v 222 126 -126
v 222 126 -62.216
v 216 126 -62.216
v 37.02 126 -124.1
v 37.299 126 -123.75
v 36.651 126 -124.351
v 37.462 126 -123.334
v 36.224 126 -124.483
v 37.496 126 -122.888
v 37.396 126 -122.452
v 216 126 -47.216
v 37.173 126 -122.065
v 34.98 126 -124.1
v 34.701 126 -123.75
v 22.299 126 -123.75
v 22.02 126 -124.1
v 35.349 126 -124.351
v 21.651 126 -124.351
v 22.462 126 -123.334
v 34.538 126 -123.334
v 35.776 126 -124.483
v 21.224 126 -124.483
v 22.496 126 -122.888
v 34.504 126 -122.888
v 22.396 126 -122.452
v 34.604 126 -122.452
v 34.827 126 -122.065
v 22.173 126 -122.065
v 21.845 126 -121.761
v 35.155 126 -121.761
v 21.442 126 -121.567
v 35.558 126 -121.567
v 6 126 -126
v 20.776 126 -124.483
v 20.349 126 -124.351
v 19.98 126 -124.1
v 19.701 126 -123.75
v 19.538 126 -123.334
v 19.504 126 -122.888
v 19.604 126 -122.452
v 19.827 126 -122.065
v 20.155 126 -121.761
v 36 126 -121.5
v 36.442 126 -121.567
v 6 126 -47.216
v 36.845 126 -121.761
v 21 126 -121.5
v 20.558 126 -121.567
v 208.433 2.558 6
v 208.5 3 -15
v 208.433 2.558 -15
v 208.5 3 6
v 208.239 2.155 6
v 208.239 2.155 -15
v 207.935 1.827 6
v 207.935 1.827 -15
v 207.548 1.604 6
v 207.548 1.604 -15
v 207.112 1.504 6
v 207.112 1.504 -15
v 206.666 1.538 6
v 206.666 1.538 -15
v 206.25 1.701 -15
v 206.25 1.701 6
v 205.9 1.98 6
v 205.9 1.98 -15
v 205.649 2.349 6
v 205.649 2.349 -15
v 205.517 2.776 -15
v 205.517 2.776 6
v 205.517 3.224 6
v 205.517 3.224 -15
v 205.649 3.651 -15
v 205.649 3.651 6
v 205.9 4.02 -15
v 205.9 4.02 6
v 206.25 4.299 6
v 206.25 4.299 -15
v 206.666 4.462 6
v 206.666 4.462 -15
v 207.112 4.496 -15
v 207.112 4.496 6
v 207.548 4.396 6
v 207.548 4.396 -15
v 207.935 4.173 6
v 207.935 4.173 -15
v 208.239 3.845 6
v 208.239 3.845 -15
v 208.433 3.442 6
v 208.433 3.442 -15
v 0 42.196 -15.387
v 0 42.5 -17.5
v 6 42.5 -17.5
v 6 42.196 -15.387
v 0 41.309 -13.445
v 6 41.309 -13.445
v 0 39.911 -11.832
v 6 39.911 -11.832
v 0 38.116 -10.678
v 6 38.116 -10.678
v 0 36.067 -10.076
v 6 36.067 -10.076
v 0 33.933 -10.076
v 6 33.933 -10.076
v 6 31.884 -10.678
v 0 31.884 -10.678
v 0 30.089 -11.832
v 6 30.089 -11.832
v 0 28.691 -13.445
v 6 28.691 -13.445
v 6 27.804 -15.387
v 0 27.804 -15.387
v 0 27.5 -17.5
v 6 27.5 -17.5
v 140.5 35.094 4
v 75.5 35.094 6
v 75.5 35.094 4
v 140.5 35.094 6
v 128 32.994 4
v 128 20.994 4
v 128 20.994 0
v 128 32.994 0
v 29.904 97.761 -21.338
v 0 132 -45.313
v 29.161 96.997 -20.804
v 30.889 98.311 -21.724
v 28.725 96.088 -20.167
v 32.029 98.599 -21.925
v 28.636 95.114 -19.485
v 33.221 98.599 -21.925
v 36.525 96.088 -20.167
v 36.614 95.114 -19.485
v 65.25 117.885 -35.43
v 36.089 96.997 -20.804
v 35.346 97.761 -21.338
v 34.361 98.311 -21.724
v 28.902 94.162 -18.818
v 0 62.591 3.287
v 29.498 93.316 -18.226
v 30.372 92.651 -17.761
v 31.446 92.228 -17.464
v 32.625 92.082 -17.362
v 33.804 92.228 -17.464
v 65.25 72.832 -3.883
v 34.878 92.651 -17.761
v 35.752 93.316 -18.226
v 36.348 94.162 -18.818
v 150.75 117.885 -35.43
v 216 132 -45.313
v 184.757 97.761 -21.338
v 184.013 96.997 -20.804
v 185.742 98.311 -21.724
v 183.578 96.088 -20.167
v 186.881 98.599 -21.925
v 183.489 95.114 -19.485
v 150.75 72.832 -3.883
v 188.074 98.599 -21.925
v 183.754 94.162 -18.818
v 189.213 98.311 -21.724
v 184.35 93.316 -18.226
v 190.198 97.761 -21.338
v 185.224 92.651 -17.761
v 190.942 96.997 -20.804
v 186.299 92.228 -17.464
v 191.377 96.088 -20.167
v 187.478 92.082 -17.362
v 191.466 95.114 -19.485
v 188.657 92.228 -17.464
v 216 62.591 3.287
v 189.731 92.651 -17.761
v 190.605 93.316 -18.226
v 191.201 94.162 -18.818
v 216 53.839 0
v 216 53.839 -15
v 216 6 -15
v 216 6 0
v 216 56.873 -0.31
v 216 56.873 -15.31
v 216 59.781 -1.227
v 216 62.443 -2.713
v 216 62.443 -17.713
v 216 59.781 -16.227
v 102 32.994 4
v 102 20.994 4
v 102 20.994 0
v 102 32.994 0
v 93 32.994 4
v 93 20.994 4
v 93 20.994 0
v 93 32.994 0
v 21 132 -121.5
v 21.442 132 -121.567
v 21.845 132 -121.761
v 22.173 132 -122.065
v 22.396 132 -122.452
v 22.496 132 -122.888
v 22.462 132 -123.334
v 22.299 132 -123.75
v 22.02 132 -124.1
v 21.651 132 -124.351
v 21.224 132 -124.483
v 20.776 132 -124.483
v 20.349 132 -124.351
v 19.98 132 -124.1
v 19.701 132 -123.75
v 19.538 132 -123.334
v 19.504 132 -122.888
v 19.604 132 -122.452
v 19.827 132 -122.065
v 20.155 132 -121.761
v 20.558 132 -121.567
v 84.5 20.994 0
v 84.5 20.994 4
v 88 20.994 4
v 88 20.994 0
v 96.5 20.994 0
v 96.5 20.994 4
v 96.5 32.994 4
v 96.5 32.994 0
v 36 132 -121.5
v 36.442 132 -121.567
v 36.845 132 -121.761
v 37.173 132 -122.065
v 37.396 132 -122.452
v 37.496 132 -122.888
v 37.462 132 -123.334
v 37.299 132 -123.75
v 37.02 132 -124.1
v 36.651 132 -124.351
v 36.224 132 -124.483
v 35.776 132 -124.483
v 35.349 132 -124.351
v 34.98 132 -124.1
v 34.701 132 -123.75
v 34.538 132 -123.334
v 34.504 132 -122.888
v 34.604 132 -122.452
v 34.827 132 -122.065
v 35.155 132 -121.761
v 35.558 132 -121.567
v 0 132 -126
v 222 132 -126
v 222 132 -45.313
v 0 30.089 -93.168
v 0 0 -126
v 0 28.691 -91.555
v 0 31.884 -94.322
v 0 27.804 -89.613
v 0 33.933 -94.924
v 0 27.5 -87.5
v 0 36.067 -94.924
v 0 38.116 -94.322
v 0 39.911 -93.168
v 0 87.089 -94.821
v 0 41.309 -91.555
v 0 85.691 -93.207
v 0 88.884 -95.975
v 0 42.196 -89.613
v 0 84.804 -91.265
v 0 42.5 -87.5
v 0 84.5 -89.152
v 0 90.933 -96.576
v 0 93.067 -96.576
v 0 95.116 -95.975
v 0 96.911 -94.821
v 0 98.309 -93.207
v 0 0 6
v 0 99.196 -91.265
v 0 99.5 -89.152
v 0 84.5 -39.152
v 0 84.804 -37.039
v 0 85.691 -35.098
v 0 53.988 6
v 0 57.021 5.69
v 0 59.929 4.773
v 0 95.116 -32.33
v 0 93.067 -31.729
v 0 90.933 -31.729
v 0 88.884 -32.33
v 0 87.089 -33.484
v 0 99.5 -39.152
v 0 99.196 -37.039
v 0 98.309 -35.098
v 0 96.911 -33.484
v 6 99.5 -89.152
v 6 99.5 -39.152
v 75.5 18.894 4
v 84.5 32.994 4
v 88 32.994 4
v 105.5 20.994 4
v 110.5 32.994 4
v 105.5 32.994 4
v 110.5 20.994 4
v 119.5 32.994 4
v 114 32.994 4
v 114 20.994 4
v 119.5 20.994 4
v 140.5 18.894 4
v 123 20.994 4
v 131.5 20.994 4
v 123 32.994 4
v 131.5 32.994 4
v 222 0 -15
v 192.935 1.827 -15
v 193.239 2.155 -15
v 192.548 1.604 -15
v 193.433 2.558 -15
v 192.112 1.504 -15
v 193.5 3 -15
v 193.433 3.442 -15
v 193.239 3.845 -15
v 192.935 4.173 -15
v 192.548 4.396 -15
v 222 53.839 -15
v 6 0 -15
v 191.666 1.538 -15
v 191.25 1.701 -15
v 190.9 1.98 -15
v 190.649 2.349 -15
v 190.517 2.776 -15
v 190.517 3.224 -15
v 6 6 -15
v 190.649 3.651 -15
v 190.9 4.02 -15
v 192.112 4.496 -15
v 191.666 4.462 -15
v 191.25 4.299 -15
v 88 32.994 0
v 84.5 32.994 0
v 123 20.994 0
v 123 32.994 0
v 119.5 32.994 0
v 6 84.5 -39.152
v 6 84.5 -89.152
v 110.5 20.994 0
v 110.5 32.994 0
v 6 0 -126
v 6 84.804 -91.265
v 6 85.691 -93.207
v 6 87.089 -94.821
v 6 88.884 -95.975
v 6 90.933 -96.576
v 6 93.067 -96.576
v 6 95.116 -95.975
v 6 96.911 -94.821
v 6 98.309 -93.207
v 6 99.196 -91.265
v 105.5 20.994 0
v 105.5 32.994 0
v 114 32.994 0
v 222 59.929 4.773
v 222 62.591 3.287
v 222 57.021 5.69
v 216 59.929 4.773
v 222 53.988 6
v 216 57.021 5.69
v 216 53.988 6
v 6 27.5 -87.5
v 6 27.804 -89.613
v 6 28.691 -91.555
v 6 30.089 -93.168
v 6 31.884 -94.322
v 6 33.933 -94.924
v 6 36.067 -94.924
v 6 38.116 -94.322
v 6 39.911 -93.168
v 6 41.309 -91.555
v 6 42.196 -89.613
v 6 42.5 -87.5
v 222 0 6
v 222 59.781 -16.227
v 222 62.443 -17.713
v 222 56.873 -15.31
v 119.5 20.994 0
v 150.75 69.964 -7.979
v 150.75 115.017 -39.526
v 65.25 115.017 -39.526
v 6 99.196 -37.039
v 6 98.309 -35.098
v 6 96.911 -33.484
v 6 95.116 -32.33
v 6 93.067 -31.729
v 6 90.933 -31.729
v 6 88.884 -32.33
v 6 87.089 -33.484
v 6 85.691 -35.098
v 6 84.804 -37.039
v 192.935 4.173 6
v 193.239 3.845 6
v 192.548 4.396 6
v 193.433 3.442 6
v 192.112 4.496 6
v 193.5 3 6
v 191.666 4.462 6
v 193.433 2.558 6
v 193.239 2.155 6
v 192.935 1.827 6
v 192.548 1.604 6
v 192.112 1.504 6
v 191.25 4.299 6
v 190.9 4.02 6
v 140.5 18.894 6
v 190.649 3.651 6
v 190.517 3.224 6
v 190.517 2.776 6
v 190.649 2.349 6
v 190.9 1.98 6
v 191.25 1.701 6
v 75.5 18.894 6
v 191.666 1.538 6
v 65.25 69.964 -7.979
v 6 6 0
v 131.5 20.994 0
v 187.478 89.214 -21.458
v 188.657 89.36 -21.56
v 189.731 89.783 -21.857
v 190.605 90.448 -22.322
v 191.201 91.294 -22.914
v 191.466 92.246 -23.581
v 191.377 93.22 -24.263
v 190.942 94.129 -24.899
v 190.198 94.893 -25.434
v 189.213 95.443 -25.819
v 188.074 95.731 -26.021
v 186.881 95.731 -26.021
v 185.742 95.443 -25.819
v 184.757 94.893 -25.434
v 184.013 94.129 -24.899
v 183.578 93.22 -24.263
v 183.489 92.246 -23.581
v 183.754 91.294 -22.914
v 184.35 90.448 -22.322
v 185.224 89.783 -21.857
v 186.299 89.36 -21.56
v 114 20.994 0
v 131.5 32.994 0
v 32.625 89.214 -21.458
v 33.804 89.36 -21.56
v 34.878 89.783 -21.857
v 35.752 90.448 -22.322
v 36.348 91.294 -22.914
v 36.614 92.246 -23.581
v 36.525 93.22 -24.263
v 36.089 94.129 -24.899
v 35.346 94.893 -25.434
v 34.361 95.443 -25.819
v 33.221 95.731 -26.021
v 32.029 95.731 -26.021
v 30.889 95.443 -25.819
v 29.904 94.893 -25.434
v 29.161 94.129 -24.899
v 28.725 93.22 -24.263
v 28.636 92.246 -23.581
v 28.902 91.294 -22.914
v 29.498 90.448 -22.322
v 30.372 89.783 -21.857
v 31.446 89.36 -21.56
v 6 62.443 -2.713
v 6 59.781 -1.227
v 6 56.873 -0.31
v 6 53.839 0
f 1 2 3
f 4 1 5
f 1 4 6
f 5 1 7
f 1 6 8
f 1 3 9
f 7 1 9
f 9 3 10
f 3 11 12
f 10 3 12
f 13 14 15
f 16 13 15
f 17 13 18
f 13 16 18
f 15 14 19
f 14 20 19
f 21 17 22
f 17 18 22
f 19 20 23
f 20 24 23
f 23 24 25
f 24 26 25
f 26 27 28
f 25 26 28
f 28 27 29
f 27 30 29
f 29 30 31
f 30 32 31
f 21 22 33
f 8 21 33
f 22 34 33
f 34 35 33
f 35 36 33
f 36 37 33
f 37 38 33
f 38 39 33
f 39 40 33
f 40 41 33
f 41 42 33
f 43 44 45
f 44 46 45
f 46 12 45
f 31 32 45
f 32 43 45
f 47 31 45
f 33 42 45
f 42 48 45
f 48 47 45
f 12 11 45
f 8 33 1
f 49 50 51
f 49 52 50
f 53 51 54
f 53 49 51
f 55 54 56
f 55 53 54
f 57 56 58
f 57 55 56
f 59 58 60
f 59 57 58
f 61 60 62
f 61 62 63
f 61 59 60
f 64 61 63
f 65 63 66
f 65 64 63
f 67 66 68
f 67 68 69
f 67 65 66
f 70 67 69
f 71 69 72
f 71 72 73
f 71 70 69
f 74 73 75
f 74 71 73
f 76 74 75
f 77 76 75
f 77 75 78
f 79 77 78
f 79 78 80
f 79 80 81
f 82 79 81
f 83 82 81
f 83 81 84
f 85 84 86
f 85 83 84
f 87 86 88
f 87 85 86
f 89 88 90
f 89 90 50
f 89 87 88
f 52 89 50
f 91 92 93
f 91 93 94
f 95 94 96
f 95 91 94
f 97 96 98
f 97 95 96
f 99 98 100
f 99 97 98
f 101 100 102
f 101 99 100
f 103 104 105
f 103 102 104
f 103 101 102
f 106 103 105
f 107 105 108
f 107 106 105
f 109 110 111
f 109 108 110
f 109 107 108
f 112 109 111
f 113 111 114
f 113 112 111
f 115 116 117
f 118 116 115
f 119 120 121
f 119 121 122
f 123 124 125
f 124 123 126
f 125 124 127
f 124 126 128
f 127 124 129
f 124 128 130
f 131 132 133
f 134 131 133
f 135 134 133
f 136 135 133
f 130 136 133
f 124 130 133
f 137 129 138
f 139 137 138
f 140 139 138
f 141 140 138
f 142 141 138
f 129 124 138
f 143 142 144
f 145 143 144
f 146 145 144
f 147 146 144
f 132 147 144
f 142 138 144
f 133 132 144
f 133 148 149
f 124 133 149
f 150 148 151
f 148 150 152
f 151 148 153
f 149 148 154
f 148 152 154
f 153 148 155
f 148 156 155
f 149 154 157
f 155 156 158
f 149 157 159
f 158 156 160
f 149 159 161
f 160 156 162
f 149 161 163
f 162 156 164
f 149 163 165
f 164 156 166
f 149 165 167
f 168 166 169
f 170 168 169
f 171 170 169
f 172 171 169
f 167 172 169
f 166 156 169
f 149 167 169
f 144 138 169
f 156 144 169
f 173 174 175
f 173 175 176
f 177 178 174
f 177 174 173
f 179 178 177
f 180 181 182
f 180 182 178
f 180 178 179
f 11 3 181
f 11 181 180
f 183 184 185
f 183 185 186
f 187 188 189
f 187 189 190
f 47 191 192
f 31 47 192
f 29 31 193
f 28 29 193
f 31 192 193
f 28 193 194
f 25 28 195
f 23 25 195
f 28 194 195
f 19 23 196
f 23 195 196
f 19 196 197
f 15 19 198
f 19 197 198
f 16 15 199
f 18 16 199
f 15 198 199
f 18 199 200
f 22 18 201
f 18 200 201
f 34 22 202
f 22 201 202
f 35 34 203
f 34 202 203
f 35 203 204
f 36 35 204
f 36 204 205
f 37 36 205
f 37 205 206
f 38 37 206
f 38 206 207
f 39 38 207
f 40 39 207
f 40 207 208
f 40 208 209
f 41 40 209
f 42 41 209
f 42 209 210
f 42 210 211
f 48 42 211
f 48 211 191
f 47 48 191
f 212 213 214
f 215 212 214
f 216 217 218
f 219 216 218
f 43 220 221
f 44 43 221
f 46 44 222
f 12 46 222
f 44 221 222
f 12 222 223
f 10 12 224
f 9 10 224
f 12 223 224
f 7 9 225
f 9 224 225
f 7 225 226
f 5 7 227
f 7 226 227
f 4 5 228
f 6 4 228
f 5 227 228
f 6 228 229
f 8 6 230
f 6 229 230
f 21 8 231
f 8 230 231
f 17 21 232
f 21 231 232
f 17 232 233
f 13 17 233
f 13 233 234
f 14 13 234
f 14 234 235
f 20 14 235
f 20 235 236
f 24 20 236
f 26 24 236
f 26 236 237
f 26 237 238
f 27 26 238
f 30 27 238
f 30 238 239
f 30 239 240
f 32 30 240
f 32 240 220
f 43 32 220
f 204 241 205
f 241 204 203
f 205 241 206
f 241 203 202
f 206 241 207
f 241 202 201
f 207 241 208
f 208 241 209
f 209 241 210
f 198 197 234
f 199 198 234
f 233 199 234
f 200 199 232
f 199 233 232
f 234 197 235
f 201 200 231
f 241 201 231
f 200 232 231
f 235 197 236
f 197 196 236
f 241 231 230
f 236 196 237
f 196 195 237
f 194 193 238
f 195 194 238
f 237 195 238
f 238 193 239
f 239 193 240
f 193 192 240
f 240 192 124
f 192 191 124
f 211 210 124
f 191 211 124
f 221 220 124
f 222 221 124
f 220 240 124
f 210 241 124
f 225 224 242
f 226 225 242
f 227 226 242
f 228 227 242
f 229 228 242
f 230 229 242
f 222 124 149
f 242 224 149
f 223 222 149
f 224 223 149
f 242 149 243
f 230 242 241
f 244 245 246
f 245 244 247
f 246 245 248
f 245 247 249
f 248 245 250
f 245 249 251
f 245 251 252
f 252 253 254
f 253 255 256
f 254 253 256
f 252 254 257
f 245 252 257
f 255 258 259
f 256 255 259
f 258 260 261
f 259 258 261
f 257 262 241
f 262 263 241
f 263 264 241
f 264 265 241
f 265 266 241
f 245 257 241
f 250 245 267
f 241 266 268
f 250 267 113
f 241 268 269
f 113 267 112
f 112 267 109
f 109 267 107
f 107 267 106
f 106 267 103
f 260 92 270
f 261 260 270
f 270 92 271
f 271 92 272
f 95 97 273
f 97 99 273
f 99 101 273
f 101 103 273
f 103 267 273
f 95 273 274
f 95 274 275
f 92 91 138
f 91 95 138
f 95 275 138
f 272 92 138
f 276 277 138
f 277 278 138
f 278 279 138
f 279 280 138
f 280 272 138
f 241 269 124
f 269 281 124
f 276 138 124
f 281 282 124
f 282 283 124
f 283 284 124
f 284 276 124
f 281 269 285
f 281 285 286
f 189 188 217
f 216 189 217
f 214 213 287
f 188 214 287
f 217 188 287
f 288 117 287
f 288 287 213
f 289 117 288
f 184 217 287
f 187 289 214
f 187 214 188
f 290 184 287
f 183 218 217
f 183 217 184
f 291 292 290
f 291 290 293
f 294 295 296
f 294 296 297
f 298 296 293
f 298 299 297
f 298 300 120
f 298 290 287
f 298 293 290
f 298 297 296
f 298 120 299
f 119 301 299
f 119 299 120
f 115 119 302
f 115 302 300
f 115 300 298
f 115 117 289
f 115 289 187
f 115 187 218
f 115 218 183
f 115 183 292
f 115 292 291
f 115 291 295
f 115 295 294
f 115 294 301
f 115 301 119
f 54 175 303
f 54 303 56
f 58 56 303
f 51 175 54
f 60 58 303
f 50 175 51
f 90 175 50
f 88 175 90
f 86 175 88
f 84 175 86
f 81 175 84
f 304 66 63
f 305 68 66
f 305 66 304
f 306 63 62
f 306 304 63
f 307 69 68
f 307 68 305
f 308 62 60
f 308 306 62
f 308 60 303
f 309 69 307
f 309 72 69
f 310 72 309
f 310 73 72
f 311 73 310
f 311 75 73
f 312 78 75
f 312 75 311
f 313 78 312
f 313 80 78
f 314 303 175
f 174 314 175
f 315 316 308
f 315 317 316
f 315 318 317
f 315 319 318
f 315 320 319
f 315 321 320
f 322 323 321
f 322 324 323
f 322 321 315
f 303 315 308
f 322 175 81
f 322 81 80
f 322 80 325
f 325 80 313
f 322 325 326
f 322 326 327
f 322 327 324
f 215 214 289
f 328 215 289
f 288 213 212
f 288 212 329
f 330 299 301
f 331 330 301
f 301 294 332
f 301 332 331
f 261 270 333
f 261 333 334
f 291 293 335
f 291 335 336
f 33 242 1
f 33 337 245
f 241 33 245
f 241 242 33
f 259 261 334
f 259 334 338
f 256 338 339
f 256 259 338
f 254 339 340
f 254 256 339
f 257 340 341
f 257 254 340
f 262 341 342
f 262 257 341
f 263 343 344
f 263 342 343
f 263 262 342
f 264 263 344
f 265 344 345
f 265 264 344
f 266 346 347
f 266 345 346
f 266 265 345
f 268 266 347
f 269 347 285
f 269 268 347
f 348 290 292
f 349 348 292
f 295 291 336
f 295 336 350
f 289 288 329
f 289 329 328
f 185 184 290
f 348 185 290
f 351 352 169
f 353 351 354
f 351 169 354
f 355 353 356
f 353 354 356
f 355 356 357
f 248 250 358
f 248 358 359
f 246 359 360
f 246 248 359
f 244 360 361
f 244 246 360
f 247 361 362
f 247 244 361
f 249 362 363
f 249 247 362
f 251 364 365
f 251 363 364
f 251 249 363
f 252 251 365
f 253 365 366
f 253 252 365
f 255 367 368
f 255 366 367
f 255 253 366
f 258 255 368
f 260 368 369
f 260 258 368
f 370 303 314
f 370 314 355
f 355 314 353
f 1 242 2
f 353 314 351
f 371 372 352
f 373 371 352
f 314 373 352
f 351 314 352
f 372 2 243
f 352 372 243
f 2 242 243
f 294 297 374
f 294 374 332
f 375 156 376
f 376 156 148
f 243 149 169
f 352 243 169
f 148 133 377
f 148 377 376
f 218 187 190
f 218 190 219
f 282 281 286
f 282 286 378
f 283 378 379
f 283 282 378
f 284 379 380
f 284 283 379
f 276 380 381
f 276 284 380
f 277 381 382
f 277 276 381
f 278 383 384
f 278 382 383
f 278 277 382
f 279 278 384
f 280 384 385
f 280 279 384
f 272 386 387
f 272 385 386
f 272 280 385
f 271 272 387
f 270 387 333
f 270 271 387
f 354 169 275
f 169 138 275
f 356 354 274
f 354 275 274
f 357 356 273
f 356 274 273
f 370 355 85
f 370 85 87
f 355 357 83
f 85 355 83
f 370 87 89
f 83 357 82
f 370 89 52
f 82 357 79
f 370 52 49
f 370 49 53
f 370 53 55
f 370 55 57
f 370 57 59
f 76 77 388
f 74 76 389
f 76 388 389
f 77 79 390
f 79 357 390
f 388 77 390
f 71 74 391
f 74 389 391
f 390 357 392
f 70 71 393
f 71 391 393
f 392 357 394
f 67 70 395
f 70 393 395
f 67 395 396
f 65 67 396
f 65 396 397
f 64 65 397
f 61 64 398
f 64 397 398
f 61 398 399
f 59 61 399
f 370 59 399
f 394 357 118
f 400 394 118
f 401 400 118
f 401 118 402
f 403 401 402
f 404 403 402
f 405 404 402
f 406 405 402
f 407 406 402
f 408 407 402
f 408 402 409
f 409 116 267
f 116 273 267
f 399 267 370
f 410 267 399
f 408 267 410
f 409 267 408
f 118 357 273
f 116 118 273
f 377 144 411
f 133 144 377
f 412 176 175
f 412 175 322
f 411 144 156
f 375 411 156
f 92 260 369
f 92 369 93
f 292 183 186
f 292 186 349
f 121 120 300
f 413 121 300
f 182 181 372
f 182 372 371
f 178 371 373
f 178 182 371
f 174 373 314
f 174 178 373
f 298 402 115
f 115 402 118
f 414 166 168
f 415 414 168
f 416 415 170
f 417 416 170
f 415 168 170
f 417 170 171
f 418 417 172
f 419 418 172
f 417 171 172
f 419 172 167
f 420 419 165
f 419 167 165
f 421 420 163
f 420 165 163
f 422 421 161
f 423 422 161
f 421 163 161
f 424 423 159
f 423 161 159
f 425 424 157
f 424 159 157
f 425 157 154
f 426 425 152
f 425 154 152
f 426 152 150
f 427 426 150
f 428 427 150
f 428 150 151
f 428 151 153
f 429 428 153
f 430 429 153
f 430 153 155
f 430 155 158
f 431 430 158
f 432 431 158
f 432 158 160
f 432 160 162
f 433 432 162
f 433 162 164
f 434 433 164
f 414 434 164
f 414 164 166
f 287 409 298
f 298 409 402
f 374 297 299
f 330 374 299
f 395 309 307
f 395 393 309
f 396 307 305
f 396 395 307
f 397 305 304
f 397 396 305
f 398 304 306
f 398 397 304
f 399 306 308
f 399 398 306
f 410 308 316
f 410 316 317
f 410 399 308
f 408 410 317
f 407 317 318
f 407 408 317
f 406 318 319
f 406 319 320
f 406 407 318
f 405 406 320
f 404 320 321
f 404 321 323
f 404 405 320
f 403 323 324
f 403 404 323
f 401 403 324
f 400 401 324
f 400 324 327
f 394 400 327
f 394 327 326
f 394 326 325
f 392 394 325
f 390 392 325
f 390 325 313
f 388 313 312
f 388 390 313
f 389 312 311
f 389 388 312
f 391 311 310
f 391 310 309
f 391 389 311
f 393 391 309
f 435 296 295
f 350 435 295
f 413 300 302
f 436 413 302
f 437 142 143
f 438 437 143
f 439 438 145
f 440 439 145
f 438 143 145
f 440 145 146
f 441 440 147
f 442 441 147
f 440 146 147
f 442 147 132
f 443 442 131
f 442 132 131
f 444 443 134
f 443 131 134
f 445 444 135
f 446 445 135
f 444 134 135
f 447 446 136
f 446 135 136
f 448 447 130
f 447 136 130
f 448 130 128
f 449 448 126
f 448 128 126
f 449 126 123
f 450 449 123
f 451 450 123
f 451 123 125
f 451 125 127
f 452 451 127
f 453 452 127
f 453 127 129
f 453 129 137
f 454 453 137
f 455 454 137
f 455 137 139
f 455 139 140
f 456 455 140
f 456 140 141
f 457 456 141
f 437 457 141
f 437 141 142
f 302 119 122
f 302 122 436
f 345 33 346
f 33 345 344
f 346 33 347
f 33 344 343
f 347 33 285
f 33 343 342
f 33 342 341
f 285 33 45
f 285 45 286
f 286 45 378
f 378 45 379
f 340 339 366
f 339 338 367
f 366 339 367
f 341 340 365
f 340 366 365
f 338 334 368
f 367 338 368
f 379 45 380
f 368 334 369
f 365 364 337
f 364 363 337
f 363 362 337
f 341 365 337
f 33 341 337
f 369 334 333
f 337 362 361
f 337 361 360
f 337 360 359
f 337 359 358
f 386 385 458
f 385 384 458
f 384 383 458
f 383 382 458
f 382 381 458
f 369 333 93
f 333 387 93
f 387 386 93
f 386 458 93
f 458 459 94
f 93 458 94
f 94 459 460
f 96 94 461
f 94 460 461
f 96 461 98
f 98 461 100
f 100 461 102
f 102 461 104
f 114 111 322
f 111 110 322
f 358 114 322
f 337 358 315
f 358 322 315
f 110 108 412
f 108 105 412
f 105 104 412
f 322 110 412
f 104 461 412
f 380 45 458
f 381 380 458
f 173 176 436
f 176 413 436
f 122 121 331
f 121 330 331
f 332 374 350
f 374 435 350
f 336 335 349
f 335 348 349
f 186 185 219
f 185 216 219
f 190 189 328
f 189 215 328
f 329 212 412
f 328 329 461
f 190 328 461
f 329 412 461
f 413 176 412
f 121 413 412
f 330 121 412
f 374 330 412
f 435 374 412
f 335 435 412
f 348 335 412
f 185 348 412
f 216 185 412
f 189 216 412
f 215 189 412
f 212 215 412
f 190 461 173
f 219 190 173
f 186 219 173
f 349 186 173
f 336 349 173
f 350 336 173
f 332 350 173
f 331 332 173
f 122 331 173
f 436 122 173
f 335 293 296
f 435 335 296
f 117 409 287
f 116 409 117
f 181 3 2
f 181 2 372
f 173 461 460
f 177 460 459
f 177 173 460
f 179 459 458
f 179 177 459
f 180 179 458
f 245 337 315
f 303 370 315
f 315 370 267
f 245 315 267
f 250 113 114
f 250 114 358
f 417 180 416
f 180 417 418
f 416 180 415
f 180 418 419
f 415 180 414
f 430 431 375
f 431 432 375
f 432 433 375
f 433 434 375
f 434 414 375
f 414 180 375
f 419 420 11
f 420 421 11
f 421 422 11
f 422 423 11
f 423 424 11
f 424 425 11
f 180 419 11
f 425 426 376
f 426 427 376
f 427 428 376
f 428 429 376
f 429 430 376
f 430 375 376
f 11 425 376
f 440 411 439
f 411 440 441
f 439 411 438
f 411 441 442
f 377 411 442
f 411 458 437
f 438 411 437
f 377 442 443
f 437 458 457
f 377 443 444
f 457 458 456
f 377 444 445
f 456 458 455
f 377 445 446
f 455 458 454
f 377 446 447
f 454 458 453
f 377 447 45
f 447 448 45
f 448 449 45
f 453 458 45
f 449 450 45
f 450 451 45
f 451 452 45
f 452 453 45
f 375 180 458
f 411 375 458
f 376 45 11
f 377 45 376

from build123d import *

# Parameters (mm, degrees)
SKETCH1_W            = 111
SKETCH1_H            = 126
BOSS_EXTRUDE1_DEPTH  = 6
SKETCH2_W            = 216
SKETCH2_H            = 111
BOSS_EXTRUDE2_DEPTH  = 6
SKETCH3_W            = 216
SKETCH3_H            = 132
BOSS_EXTRUDE3_DEPTH  = 6
SKETCH5_W            = 216
SKETCH5_H            = 99.986345045
CUT_EXTRUDE1_DEPTH   = 75
SKETCH7_W            = 216
SKETCH7_H            = 99.986345045
BOSS_EXTRUDE4_DEPTH  = 5
CUT_EXTRUDE2_DEPTH   = 314
SKETCH9_W            = 85.5
SKETCH9_H            = 55
CUT_EXTRUDE3_DEPTH   = 14
FILLET1_R            = 15
CUT_EXTRUDE4_DEPTH   = 27
SKETCH11_W           = 65
SKETCH11_H           = 16.2
CUT_EXTRUDE5_DEPTH   = 2
SKETCH12_W           = 3.5
SKETCH12_H           = 12
CUT_EXTRUDE6_DEPTH   = 11
BOSS_EXTRUDE5_DEPTH  = 6
SKETCH22_R           = 1.5
CUT_EXTRUDE13_DEPTH  = 20
BOSS_EXTRUDE6_DEPTH  = 15
SKETCH25_R           = 1.5
CUT_EXTRUDE14_DEPTH  = 15
BOSS_EXTRUDE9_START  = -6
BOSS_EXTRUDE9_DEPTH  = 6
SKETCH35_W           = 210
SKETCH35_H           = 6
SKETCH35_R           = 1.5
BOSS_EXTRUDE10_DEPTH = 15
SKETCH36_R           = 4
CUT_EXTRUDE16_DEPTH  = 15
SKETCH37_R           = 4
CUT_EXTRUDE17_DEPTH  = 15


with BuildPart() as part:
    # Sketch1 → Boss-Extrude1 (new body)
    with BuildSketch(Plane(origin=(0, 0, 0), x_dir=(0, 0, -1), z_dir=(1, 0, 0))):
        with Locations((55.5, 63)):
            Rectangle(SKETCH1_W, SKETCH1_H)
    extrude(amount=BOSS_EXTRUDE1_DEPTH)

    # Sketch2 → Boss-Extrude2 (add)
    with BuildSketch(Plane(origin=(0, 126, 0), x_dir=(1, 0, 0), z_dir=(0, 1, 0))):
        with Locations((108, 55.5)):
            Rectangle(SKETCH2_W, SKETCH2_H)
    extrude(amount=BOSS_EXTRUDE2_DEPTH)

    # Sketch3 → Boss-Extrude3 (add)
    with BuildSketch(Plane.XY):
        with Locations((108, 66)):
            Rectangle(SKETCH3_W, SKETCH3_H)
    extrude(amount=BOSS_EXTRUDE3_DEPTH)

    # Sketch5 → Cut-Extrude1 (cut)
    with BuildSketch(Plane(origin=(0, 19.268574279, 27.51837595), x_dir=(1, 0, 0), z_dir=(0, -0.5735764363510416, -0.8191520442889949))):
        with Locations((108, -87.509316119)):
            Rectangle(SKETCH5_W, SKETCH5_H)
    extrude(amount=-CUT_EXTRUDE1_DEPTH, mode=Mode.SUBTRACT)

    # Sketch7 → Boss-Extrude4 (add)
    with BuildSketch(Plane(origin=(0, 19.268574279, 27.51837595), x_dir=(1, 0, 0), z_dir=(0, -0.5735764363510416, -0.8191520442889949))):
        with Locations((108, -87.509316119)):
            Rectangle(SKETCH7_W, SKETCH7_H)
    extrude(amount=-BOSS_EXTRUDE4_DEPTH)

    # Sketch8 → Cut-Extrude2 (cut)
    with BuildSketch(Plane(origin=(216, 0, 0), x_dir=(0, 0, -1), z_dir=(1, 0, 0))):
        Polygon((-6, 50), (-6, 58.717233978), (-10.095760221, 52.867882182), align=None)
        Polygon((51.212736322, 132), (45.313145189, 132), (47.254051253, 134.771901126), align=None)
    extrude(amount=-CUT_EXTRUDE2_DEPTH, mode=Mode.SUBTRACT)

    # Sketch9 → Cut-Extrude3 (cut)
    with BuildSketch(Plane(origin=(0, 22.136456461, 31.614136171), x_dir=(1, 0, 0), z_dir=(0, 0.5735764363510417, 0.8191520442889949))):
        with Locations((108, 89.387752907)):
            Rectangle(SKETCH9_W, SKETCH9_H)
    extrude(amount=-CUT_EXTRUDE3_DEPTH, mode=Mode.SUBTRACT)

    # Fillet1
    fillet1_edges = [part.edges().sort_by_distance(p)[0] for p in [
        (111, 58.56888804, 0),
        (108, 58.717233978, 6),
    ]]
    fillet(fillet1_edges, radius=FILLET1_R)

    # Sketch10 → Cut-Extrude4 (cut)
    with BuildSketch(Plane.ZY):
        with BuildLine():
            Line((-87.5, 42.5), (-17.5, 42.5))
            ThreePointArc((-17.5, 42.5), (-10, 35), (-17.5, 27.5))
            Line((-17.5, 27.5), (-87.5, 27.5))
            ThreePointArc((-87.5, 27.5), (-95, 35), (-87.5, 42.5))
        make_face()
        with BuildLine():
            Line((-89.152421831, 99.5), (-39.152421831, 99.5))
            ThreePointArc((-39.152421831, 99.5), (-31.652421831, 92), (-39.152421831, 84.5))
            Line((-39.152421831, 84.5), (-89.152421831, 84.5))
            ThreePointArc((-89.152421831, 84.5), (-96.652421831, 92), (-89.152421831, 99.5))
        make_face()
    extrude(amount=-CUT_EXTRUDE4_DEPTH, mode=Mode.SUBTRACT)

    # Sketch11 → Cut-Extrude5 (cut)
    with BuildSketch(Plane.XY.offset(6)):
        with Locations((108, 26.993876072)):
            Rectangle(SKETCH11_W, SKETCH11_H)
    extrude(amount=-CUT_EXTRUDE5_DEPTH, mode=Mode.SUBTRACT)

    # Sketch12 → Cut-Extrude6 (cut)
    with BuildSketch(Plane.XY.offset(4)):
        with Locations((86.25, 26.993876072)):
            Rectangle(SKETCH12_W, SKETCH12_H)
        with Locations((94.75, 26.993876072)):
            Rectangle(SKETCH12_W, SKETCH12_H)
        with Locations((103.75, 26.993876072)):
            Rectangle(SKETCH12_W, SKETCH12_H)
        with Locations((112.25, 26.993876072)):
            Rectangle(SKETCH12_W, SKETCH12_H)
        with Locations((121.25, 26.993876072)):
            Rectangle(SKETCH12_W, SKETCH12_H)
        with Locations((129.75, 26.993876072)):
            Rectangle(SKETCH12_W, SKETCH12_H)
    extrude(amount=-CUT_EXTRUDE6_DEPTH, mode=Mode.SUBTRACT)

    # Sketch13 → Boss-Extrude5 (add)
    with BuildSketch(Plane(origin=(216, 0, 0), x_dir=(0, 0, -1), z_dir=(1, 0, 0))):
        with BuildLine():
            Line((111, 126), (111, 132))
            Line((111, 132), (45.313145189, 132))
            Line((45.313145189, 132), (-3.287280664, 62.59139869))
            ThreePointArc((-3.287280664, 62.59139869), (-5.305754261, 58.498339137), (-6, 53.987752145))
            Line((-6, 53.987752145), (-6, 0))
            Line((-6, 0), (0, 0))
            Line((0, 0), (0, 53.839406207))
            ThreePointArc((0, 53.839406207), (0.694245739, 58.3499932), (2.712719336, 62.443052753))
            Line((2.712719336, 62.443052753), (47.215772904, 126))
            Line((47.215772904, 126), (111, 126))
        make_face()
    extrude(amount=BOSS_EXTRUDE5_DEPTH)

    # Sketch22 → Cut-Extrude13 (cut)
    with BuildSketch(Plane.XY.offset(6)):
        with Locations((207, 3)):
            Circle(SKETCH22_R)
        with Locations((192, 3)):
            Circle(SKETCH22_R)
    extrude(amount=-CUT_EXTRUDE13_DEPTH, mode=Mode.SUBTRACT)

    # Sketch24 → Boss-Extrude6 (add)
    with BuildSketch(Plane(origin=(0, 0, -111), x_dir=(-1, 0, 0), z_dir=(0, 0, -1))):
        Polygon((-222, 132), (-222, 126), (-6, 126), (-6, 0), (0, 0), (0, 132), align=None)
    extrude(amount=BOSS_EXTRUDE6_DEPTH)

    # Sketch25 → Cut-Extrude14 (cut)
    with BuildSketch(Plane(origin=(0, 132, 0), x_dir=(1, 0, 0), z_dir=(0, 1, 0))):
        with Locations(Location((21, 123, 0), (0, 0, 270))):
            Circle(SKETCH25_R)
        with Locations(Location((36, 123, 0), (0, 0, 270))):
            Circle(SKETCH25_R)
    extrude(amount=-CUT_EXTRUDE14_DEPTH, mode=Mode.SUBTRACT)

    # Sketch34 → Boss-Extrude9 (add)
    with BuildSketch(Plane(origin=(222, 0, 0), x_dir=(0, 0, -1), z_dir=(1, 0, 0)).offset(BOSS_EXTRUDE9_START)):
        with BuildLine():
            Line((2.712719336, 62.443052753), (47.215772904, 126))
            Line((47.215772904, 126), (62.215772904, 126))
            Line((62.215772904, 126), (17.712719336, 62.443052753))
            ThreePointArc((17.712719336, 62.443052753), (15.694245739, 58.3499932), (15, 53.839406207))
            Line((15, 53.839406207), (15, 0))
            Line((15, 0), (0, 0))
            Line((0, 0), (0, 53.839406207))
            ThreePointArc((0, 53.839406207), (0.694245739, 58.3499932), (2.712719336, 62.443052753))
        make_face()
    extrude(amount=BOSS_EXTRUDE9_DEPTH)

    # Sketch35 → Boss-Extrude10 (add)
    with BuildSketch(Plane(origin=(0, 0, 0), x_dir=(-1, 0, 0), z_dir=(0, 0, -1))):
        with Locations((-111, 3)):
            Rectangle(SKETCH35_W, SKETCH35_H)
        with Locations(Location((-207, 3, 0), (0, 0, 180))):
            Circle(SKETCH35_R, mode=Mode.SUBTRACT)
        with Locations(Location((-192, 3, 0), (0, 0, 180))):
            Circle(SKETCH35_R, mode=Mode.SUBTRACT)
    extrude(amount=BOSS_EXTRUDE10_DEPTH)

    # Sketch36 → Cut-Extrude16 (cut)
    with BuildSketch(Plane(origin=(0, 22.136456461, 31.614136171), x_dir=(1, 0, 0), z_dir=(0, 0.5735764363510417, 0.8191520442889949))):
        with Locations(Location((187.47755458, 89.387752907, 0), (0, 0, 270))):
            Circle(SKETCH36_R)
    extrude(amount=-CUT_EXTRUDE16_DEPTH, mode=Mode.SUBTRACT)

    # Sketch37 → Cut-Extrude17 (cut)
    with BuildSketch(Plane(origin=(0, 22.136456461, 31.614136171), x_dir=(1, 0, 0), z_dir=(0, 0.5735764363510417, 0.8191520442889949))):
        with Locations(Location((32.625, 89.387752907, 0), (0, 0, 270))):
            Circle(SKETCH37_R)
    extrude(amount=-CUT_EXTRUDE17_DEPTH, mode=Mode.SUBTRACT)


solid = part.part
